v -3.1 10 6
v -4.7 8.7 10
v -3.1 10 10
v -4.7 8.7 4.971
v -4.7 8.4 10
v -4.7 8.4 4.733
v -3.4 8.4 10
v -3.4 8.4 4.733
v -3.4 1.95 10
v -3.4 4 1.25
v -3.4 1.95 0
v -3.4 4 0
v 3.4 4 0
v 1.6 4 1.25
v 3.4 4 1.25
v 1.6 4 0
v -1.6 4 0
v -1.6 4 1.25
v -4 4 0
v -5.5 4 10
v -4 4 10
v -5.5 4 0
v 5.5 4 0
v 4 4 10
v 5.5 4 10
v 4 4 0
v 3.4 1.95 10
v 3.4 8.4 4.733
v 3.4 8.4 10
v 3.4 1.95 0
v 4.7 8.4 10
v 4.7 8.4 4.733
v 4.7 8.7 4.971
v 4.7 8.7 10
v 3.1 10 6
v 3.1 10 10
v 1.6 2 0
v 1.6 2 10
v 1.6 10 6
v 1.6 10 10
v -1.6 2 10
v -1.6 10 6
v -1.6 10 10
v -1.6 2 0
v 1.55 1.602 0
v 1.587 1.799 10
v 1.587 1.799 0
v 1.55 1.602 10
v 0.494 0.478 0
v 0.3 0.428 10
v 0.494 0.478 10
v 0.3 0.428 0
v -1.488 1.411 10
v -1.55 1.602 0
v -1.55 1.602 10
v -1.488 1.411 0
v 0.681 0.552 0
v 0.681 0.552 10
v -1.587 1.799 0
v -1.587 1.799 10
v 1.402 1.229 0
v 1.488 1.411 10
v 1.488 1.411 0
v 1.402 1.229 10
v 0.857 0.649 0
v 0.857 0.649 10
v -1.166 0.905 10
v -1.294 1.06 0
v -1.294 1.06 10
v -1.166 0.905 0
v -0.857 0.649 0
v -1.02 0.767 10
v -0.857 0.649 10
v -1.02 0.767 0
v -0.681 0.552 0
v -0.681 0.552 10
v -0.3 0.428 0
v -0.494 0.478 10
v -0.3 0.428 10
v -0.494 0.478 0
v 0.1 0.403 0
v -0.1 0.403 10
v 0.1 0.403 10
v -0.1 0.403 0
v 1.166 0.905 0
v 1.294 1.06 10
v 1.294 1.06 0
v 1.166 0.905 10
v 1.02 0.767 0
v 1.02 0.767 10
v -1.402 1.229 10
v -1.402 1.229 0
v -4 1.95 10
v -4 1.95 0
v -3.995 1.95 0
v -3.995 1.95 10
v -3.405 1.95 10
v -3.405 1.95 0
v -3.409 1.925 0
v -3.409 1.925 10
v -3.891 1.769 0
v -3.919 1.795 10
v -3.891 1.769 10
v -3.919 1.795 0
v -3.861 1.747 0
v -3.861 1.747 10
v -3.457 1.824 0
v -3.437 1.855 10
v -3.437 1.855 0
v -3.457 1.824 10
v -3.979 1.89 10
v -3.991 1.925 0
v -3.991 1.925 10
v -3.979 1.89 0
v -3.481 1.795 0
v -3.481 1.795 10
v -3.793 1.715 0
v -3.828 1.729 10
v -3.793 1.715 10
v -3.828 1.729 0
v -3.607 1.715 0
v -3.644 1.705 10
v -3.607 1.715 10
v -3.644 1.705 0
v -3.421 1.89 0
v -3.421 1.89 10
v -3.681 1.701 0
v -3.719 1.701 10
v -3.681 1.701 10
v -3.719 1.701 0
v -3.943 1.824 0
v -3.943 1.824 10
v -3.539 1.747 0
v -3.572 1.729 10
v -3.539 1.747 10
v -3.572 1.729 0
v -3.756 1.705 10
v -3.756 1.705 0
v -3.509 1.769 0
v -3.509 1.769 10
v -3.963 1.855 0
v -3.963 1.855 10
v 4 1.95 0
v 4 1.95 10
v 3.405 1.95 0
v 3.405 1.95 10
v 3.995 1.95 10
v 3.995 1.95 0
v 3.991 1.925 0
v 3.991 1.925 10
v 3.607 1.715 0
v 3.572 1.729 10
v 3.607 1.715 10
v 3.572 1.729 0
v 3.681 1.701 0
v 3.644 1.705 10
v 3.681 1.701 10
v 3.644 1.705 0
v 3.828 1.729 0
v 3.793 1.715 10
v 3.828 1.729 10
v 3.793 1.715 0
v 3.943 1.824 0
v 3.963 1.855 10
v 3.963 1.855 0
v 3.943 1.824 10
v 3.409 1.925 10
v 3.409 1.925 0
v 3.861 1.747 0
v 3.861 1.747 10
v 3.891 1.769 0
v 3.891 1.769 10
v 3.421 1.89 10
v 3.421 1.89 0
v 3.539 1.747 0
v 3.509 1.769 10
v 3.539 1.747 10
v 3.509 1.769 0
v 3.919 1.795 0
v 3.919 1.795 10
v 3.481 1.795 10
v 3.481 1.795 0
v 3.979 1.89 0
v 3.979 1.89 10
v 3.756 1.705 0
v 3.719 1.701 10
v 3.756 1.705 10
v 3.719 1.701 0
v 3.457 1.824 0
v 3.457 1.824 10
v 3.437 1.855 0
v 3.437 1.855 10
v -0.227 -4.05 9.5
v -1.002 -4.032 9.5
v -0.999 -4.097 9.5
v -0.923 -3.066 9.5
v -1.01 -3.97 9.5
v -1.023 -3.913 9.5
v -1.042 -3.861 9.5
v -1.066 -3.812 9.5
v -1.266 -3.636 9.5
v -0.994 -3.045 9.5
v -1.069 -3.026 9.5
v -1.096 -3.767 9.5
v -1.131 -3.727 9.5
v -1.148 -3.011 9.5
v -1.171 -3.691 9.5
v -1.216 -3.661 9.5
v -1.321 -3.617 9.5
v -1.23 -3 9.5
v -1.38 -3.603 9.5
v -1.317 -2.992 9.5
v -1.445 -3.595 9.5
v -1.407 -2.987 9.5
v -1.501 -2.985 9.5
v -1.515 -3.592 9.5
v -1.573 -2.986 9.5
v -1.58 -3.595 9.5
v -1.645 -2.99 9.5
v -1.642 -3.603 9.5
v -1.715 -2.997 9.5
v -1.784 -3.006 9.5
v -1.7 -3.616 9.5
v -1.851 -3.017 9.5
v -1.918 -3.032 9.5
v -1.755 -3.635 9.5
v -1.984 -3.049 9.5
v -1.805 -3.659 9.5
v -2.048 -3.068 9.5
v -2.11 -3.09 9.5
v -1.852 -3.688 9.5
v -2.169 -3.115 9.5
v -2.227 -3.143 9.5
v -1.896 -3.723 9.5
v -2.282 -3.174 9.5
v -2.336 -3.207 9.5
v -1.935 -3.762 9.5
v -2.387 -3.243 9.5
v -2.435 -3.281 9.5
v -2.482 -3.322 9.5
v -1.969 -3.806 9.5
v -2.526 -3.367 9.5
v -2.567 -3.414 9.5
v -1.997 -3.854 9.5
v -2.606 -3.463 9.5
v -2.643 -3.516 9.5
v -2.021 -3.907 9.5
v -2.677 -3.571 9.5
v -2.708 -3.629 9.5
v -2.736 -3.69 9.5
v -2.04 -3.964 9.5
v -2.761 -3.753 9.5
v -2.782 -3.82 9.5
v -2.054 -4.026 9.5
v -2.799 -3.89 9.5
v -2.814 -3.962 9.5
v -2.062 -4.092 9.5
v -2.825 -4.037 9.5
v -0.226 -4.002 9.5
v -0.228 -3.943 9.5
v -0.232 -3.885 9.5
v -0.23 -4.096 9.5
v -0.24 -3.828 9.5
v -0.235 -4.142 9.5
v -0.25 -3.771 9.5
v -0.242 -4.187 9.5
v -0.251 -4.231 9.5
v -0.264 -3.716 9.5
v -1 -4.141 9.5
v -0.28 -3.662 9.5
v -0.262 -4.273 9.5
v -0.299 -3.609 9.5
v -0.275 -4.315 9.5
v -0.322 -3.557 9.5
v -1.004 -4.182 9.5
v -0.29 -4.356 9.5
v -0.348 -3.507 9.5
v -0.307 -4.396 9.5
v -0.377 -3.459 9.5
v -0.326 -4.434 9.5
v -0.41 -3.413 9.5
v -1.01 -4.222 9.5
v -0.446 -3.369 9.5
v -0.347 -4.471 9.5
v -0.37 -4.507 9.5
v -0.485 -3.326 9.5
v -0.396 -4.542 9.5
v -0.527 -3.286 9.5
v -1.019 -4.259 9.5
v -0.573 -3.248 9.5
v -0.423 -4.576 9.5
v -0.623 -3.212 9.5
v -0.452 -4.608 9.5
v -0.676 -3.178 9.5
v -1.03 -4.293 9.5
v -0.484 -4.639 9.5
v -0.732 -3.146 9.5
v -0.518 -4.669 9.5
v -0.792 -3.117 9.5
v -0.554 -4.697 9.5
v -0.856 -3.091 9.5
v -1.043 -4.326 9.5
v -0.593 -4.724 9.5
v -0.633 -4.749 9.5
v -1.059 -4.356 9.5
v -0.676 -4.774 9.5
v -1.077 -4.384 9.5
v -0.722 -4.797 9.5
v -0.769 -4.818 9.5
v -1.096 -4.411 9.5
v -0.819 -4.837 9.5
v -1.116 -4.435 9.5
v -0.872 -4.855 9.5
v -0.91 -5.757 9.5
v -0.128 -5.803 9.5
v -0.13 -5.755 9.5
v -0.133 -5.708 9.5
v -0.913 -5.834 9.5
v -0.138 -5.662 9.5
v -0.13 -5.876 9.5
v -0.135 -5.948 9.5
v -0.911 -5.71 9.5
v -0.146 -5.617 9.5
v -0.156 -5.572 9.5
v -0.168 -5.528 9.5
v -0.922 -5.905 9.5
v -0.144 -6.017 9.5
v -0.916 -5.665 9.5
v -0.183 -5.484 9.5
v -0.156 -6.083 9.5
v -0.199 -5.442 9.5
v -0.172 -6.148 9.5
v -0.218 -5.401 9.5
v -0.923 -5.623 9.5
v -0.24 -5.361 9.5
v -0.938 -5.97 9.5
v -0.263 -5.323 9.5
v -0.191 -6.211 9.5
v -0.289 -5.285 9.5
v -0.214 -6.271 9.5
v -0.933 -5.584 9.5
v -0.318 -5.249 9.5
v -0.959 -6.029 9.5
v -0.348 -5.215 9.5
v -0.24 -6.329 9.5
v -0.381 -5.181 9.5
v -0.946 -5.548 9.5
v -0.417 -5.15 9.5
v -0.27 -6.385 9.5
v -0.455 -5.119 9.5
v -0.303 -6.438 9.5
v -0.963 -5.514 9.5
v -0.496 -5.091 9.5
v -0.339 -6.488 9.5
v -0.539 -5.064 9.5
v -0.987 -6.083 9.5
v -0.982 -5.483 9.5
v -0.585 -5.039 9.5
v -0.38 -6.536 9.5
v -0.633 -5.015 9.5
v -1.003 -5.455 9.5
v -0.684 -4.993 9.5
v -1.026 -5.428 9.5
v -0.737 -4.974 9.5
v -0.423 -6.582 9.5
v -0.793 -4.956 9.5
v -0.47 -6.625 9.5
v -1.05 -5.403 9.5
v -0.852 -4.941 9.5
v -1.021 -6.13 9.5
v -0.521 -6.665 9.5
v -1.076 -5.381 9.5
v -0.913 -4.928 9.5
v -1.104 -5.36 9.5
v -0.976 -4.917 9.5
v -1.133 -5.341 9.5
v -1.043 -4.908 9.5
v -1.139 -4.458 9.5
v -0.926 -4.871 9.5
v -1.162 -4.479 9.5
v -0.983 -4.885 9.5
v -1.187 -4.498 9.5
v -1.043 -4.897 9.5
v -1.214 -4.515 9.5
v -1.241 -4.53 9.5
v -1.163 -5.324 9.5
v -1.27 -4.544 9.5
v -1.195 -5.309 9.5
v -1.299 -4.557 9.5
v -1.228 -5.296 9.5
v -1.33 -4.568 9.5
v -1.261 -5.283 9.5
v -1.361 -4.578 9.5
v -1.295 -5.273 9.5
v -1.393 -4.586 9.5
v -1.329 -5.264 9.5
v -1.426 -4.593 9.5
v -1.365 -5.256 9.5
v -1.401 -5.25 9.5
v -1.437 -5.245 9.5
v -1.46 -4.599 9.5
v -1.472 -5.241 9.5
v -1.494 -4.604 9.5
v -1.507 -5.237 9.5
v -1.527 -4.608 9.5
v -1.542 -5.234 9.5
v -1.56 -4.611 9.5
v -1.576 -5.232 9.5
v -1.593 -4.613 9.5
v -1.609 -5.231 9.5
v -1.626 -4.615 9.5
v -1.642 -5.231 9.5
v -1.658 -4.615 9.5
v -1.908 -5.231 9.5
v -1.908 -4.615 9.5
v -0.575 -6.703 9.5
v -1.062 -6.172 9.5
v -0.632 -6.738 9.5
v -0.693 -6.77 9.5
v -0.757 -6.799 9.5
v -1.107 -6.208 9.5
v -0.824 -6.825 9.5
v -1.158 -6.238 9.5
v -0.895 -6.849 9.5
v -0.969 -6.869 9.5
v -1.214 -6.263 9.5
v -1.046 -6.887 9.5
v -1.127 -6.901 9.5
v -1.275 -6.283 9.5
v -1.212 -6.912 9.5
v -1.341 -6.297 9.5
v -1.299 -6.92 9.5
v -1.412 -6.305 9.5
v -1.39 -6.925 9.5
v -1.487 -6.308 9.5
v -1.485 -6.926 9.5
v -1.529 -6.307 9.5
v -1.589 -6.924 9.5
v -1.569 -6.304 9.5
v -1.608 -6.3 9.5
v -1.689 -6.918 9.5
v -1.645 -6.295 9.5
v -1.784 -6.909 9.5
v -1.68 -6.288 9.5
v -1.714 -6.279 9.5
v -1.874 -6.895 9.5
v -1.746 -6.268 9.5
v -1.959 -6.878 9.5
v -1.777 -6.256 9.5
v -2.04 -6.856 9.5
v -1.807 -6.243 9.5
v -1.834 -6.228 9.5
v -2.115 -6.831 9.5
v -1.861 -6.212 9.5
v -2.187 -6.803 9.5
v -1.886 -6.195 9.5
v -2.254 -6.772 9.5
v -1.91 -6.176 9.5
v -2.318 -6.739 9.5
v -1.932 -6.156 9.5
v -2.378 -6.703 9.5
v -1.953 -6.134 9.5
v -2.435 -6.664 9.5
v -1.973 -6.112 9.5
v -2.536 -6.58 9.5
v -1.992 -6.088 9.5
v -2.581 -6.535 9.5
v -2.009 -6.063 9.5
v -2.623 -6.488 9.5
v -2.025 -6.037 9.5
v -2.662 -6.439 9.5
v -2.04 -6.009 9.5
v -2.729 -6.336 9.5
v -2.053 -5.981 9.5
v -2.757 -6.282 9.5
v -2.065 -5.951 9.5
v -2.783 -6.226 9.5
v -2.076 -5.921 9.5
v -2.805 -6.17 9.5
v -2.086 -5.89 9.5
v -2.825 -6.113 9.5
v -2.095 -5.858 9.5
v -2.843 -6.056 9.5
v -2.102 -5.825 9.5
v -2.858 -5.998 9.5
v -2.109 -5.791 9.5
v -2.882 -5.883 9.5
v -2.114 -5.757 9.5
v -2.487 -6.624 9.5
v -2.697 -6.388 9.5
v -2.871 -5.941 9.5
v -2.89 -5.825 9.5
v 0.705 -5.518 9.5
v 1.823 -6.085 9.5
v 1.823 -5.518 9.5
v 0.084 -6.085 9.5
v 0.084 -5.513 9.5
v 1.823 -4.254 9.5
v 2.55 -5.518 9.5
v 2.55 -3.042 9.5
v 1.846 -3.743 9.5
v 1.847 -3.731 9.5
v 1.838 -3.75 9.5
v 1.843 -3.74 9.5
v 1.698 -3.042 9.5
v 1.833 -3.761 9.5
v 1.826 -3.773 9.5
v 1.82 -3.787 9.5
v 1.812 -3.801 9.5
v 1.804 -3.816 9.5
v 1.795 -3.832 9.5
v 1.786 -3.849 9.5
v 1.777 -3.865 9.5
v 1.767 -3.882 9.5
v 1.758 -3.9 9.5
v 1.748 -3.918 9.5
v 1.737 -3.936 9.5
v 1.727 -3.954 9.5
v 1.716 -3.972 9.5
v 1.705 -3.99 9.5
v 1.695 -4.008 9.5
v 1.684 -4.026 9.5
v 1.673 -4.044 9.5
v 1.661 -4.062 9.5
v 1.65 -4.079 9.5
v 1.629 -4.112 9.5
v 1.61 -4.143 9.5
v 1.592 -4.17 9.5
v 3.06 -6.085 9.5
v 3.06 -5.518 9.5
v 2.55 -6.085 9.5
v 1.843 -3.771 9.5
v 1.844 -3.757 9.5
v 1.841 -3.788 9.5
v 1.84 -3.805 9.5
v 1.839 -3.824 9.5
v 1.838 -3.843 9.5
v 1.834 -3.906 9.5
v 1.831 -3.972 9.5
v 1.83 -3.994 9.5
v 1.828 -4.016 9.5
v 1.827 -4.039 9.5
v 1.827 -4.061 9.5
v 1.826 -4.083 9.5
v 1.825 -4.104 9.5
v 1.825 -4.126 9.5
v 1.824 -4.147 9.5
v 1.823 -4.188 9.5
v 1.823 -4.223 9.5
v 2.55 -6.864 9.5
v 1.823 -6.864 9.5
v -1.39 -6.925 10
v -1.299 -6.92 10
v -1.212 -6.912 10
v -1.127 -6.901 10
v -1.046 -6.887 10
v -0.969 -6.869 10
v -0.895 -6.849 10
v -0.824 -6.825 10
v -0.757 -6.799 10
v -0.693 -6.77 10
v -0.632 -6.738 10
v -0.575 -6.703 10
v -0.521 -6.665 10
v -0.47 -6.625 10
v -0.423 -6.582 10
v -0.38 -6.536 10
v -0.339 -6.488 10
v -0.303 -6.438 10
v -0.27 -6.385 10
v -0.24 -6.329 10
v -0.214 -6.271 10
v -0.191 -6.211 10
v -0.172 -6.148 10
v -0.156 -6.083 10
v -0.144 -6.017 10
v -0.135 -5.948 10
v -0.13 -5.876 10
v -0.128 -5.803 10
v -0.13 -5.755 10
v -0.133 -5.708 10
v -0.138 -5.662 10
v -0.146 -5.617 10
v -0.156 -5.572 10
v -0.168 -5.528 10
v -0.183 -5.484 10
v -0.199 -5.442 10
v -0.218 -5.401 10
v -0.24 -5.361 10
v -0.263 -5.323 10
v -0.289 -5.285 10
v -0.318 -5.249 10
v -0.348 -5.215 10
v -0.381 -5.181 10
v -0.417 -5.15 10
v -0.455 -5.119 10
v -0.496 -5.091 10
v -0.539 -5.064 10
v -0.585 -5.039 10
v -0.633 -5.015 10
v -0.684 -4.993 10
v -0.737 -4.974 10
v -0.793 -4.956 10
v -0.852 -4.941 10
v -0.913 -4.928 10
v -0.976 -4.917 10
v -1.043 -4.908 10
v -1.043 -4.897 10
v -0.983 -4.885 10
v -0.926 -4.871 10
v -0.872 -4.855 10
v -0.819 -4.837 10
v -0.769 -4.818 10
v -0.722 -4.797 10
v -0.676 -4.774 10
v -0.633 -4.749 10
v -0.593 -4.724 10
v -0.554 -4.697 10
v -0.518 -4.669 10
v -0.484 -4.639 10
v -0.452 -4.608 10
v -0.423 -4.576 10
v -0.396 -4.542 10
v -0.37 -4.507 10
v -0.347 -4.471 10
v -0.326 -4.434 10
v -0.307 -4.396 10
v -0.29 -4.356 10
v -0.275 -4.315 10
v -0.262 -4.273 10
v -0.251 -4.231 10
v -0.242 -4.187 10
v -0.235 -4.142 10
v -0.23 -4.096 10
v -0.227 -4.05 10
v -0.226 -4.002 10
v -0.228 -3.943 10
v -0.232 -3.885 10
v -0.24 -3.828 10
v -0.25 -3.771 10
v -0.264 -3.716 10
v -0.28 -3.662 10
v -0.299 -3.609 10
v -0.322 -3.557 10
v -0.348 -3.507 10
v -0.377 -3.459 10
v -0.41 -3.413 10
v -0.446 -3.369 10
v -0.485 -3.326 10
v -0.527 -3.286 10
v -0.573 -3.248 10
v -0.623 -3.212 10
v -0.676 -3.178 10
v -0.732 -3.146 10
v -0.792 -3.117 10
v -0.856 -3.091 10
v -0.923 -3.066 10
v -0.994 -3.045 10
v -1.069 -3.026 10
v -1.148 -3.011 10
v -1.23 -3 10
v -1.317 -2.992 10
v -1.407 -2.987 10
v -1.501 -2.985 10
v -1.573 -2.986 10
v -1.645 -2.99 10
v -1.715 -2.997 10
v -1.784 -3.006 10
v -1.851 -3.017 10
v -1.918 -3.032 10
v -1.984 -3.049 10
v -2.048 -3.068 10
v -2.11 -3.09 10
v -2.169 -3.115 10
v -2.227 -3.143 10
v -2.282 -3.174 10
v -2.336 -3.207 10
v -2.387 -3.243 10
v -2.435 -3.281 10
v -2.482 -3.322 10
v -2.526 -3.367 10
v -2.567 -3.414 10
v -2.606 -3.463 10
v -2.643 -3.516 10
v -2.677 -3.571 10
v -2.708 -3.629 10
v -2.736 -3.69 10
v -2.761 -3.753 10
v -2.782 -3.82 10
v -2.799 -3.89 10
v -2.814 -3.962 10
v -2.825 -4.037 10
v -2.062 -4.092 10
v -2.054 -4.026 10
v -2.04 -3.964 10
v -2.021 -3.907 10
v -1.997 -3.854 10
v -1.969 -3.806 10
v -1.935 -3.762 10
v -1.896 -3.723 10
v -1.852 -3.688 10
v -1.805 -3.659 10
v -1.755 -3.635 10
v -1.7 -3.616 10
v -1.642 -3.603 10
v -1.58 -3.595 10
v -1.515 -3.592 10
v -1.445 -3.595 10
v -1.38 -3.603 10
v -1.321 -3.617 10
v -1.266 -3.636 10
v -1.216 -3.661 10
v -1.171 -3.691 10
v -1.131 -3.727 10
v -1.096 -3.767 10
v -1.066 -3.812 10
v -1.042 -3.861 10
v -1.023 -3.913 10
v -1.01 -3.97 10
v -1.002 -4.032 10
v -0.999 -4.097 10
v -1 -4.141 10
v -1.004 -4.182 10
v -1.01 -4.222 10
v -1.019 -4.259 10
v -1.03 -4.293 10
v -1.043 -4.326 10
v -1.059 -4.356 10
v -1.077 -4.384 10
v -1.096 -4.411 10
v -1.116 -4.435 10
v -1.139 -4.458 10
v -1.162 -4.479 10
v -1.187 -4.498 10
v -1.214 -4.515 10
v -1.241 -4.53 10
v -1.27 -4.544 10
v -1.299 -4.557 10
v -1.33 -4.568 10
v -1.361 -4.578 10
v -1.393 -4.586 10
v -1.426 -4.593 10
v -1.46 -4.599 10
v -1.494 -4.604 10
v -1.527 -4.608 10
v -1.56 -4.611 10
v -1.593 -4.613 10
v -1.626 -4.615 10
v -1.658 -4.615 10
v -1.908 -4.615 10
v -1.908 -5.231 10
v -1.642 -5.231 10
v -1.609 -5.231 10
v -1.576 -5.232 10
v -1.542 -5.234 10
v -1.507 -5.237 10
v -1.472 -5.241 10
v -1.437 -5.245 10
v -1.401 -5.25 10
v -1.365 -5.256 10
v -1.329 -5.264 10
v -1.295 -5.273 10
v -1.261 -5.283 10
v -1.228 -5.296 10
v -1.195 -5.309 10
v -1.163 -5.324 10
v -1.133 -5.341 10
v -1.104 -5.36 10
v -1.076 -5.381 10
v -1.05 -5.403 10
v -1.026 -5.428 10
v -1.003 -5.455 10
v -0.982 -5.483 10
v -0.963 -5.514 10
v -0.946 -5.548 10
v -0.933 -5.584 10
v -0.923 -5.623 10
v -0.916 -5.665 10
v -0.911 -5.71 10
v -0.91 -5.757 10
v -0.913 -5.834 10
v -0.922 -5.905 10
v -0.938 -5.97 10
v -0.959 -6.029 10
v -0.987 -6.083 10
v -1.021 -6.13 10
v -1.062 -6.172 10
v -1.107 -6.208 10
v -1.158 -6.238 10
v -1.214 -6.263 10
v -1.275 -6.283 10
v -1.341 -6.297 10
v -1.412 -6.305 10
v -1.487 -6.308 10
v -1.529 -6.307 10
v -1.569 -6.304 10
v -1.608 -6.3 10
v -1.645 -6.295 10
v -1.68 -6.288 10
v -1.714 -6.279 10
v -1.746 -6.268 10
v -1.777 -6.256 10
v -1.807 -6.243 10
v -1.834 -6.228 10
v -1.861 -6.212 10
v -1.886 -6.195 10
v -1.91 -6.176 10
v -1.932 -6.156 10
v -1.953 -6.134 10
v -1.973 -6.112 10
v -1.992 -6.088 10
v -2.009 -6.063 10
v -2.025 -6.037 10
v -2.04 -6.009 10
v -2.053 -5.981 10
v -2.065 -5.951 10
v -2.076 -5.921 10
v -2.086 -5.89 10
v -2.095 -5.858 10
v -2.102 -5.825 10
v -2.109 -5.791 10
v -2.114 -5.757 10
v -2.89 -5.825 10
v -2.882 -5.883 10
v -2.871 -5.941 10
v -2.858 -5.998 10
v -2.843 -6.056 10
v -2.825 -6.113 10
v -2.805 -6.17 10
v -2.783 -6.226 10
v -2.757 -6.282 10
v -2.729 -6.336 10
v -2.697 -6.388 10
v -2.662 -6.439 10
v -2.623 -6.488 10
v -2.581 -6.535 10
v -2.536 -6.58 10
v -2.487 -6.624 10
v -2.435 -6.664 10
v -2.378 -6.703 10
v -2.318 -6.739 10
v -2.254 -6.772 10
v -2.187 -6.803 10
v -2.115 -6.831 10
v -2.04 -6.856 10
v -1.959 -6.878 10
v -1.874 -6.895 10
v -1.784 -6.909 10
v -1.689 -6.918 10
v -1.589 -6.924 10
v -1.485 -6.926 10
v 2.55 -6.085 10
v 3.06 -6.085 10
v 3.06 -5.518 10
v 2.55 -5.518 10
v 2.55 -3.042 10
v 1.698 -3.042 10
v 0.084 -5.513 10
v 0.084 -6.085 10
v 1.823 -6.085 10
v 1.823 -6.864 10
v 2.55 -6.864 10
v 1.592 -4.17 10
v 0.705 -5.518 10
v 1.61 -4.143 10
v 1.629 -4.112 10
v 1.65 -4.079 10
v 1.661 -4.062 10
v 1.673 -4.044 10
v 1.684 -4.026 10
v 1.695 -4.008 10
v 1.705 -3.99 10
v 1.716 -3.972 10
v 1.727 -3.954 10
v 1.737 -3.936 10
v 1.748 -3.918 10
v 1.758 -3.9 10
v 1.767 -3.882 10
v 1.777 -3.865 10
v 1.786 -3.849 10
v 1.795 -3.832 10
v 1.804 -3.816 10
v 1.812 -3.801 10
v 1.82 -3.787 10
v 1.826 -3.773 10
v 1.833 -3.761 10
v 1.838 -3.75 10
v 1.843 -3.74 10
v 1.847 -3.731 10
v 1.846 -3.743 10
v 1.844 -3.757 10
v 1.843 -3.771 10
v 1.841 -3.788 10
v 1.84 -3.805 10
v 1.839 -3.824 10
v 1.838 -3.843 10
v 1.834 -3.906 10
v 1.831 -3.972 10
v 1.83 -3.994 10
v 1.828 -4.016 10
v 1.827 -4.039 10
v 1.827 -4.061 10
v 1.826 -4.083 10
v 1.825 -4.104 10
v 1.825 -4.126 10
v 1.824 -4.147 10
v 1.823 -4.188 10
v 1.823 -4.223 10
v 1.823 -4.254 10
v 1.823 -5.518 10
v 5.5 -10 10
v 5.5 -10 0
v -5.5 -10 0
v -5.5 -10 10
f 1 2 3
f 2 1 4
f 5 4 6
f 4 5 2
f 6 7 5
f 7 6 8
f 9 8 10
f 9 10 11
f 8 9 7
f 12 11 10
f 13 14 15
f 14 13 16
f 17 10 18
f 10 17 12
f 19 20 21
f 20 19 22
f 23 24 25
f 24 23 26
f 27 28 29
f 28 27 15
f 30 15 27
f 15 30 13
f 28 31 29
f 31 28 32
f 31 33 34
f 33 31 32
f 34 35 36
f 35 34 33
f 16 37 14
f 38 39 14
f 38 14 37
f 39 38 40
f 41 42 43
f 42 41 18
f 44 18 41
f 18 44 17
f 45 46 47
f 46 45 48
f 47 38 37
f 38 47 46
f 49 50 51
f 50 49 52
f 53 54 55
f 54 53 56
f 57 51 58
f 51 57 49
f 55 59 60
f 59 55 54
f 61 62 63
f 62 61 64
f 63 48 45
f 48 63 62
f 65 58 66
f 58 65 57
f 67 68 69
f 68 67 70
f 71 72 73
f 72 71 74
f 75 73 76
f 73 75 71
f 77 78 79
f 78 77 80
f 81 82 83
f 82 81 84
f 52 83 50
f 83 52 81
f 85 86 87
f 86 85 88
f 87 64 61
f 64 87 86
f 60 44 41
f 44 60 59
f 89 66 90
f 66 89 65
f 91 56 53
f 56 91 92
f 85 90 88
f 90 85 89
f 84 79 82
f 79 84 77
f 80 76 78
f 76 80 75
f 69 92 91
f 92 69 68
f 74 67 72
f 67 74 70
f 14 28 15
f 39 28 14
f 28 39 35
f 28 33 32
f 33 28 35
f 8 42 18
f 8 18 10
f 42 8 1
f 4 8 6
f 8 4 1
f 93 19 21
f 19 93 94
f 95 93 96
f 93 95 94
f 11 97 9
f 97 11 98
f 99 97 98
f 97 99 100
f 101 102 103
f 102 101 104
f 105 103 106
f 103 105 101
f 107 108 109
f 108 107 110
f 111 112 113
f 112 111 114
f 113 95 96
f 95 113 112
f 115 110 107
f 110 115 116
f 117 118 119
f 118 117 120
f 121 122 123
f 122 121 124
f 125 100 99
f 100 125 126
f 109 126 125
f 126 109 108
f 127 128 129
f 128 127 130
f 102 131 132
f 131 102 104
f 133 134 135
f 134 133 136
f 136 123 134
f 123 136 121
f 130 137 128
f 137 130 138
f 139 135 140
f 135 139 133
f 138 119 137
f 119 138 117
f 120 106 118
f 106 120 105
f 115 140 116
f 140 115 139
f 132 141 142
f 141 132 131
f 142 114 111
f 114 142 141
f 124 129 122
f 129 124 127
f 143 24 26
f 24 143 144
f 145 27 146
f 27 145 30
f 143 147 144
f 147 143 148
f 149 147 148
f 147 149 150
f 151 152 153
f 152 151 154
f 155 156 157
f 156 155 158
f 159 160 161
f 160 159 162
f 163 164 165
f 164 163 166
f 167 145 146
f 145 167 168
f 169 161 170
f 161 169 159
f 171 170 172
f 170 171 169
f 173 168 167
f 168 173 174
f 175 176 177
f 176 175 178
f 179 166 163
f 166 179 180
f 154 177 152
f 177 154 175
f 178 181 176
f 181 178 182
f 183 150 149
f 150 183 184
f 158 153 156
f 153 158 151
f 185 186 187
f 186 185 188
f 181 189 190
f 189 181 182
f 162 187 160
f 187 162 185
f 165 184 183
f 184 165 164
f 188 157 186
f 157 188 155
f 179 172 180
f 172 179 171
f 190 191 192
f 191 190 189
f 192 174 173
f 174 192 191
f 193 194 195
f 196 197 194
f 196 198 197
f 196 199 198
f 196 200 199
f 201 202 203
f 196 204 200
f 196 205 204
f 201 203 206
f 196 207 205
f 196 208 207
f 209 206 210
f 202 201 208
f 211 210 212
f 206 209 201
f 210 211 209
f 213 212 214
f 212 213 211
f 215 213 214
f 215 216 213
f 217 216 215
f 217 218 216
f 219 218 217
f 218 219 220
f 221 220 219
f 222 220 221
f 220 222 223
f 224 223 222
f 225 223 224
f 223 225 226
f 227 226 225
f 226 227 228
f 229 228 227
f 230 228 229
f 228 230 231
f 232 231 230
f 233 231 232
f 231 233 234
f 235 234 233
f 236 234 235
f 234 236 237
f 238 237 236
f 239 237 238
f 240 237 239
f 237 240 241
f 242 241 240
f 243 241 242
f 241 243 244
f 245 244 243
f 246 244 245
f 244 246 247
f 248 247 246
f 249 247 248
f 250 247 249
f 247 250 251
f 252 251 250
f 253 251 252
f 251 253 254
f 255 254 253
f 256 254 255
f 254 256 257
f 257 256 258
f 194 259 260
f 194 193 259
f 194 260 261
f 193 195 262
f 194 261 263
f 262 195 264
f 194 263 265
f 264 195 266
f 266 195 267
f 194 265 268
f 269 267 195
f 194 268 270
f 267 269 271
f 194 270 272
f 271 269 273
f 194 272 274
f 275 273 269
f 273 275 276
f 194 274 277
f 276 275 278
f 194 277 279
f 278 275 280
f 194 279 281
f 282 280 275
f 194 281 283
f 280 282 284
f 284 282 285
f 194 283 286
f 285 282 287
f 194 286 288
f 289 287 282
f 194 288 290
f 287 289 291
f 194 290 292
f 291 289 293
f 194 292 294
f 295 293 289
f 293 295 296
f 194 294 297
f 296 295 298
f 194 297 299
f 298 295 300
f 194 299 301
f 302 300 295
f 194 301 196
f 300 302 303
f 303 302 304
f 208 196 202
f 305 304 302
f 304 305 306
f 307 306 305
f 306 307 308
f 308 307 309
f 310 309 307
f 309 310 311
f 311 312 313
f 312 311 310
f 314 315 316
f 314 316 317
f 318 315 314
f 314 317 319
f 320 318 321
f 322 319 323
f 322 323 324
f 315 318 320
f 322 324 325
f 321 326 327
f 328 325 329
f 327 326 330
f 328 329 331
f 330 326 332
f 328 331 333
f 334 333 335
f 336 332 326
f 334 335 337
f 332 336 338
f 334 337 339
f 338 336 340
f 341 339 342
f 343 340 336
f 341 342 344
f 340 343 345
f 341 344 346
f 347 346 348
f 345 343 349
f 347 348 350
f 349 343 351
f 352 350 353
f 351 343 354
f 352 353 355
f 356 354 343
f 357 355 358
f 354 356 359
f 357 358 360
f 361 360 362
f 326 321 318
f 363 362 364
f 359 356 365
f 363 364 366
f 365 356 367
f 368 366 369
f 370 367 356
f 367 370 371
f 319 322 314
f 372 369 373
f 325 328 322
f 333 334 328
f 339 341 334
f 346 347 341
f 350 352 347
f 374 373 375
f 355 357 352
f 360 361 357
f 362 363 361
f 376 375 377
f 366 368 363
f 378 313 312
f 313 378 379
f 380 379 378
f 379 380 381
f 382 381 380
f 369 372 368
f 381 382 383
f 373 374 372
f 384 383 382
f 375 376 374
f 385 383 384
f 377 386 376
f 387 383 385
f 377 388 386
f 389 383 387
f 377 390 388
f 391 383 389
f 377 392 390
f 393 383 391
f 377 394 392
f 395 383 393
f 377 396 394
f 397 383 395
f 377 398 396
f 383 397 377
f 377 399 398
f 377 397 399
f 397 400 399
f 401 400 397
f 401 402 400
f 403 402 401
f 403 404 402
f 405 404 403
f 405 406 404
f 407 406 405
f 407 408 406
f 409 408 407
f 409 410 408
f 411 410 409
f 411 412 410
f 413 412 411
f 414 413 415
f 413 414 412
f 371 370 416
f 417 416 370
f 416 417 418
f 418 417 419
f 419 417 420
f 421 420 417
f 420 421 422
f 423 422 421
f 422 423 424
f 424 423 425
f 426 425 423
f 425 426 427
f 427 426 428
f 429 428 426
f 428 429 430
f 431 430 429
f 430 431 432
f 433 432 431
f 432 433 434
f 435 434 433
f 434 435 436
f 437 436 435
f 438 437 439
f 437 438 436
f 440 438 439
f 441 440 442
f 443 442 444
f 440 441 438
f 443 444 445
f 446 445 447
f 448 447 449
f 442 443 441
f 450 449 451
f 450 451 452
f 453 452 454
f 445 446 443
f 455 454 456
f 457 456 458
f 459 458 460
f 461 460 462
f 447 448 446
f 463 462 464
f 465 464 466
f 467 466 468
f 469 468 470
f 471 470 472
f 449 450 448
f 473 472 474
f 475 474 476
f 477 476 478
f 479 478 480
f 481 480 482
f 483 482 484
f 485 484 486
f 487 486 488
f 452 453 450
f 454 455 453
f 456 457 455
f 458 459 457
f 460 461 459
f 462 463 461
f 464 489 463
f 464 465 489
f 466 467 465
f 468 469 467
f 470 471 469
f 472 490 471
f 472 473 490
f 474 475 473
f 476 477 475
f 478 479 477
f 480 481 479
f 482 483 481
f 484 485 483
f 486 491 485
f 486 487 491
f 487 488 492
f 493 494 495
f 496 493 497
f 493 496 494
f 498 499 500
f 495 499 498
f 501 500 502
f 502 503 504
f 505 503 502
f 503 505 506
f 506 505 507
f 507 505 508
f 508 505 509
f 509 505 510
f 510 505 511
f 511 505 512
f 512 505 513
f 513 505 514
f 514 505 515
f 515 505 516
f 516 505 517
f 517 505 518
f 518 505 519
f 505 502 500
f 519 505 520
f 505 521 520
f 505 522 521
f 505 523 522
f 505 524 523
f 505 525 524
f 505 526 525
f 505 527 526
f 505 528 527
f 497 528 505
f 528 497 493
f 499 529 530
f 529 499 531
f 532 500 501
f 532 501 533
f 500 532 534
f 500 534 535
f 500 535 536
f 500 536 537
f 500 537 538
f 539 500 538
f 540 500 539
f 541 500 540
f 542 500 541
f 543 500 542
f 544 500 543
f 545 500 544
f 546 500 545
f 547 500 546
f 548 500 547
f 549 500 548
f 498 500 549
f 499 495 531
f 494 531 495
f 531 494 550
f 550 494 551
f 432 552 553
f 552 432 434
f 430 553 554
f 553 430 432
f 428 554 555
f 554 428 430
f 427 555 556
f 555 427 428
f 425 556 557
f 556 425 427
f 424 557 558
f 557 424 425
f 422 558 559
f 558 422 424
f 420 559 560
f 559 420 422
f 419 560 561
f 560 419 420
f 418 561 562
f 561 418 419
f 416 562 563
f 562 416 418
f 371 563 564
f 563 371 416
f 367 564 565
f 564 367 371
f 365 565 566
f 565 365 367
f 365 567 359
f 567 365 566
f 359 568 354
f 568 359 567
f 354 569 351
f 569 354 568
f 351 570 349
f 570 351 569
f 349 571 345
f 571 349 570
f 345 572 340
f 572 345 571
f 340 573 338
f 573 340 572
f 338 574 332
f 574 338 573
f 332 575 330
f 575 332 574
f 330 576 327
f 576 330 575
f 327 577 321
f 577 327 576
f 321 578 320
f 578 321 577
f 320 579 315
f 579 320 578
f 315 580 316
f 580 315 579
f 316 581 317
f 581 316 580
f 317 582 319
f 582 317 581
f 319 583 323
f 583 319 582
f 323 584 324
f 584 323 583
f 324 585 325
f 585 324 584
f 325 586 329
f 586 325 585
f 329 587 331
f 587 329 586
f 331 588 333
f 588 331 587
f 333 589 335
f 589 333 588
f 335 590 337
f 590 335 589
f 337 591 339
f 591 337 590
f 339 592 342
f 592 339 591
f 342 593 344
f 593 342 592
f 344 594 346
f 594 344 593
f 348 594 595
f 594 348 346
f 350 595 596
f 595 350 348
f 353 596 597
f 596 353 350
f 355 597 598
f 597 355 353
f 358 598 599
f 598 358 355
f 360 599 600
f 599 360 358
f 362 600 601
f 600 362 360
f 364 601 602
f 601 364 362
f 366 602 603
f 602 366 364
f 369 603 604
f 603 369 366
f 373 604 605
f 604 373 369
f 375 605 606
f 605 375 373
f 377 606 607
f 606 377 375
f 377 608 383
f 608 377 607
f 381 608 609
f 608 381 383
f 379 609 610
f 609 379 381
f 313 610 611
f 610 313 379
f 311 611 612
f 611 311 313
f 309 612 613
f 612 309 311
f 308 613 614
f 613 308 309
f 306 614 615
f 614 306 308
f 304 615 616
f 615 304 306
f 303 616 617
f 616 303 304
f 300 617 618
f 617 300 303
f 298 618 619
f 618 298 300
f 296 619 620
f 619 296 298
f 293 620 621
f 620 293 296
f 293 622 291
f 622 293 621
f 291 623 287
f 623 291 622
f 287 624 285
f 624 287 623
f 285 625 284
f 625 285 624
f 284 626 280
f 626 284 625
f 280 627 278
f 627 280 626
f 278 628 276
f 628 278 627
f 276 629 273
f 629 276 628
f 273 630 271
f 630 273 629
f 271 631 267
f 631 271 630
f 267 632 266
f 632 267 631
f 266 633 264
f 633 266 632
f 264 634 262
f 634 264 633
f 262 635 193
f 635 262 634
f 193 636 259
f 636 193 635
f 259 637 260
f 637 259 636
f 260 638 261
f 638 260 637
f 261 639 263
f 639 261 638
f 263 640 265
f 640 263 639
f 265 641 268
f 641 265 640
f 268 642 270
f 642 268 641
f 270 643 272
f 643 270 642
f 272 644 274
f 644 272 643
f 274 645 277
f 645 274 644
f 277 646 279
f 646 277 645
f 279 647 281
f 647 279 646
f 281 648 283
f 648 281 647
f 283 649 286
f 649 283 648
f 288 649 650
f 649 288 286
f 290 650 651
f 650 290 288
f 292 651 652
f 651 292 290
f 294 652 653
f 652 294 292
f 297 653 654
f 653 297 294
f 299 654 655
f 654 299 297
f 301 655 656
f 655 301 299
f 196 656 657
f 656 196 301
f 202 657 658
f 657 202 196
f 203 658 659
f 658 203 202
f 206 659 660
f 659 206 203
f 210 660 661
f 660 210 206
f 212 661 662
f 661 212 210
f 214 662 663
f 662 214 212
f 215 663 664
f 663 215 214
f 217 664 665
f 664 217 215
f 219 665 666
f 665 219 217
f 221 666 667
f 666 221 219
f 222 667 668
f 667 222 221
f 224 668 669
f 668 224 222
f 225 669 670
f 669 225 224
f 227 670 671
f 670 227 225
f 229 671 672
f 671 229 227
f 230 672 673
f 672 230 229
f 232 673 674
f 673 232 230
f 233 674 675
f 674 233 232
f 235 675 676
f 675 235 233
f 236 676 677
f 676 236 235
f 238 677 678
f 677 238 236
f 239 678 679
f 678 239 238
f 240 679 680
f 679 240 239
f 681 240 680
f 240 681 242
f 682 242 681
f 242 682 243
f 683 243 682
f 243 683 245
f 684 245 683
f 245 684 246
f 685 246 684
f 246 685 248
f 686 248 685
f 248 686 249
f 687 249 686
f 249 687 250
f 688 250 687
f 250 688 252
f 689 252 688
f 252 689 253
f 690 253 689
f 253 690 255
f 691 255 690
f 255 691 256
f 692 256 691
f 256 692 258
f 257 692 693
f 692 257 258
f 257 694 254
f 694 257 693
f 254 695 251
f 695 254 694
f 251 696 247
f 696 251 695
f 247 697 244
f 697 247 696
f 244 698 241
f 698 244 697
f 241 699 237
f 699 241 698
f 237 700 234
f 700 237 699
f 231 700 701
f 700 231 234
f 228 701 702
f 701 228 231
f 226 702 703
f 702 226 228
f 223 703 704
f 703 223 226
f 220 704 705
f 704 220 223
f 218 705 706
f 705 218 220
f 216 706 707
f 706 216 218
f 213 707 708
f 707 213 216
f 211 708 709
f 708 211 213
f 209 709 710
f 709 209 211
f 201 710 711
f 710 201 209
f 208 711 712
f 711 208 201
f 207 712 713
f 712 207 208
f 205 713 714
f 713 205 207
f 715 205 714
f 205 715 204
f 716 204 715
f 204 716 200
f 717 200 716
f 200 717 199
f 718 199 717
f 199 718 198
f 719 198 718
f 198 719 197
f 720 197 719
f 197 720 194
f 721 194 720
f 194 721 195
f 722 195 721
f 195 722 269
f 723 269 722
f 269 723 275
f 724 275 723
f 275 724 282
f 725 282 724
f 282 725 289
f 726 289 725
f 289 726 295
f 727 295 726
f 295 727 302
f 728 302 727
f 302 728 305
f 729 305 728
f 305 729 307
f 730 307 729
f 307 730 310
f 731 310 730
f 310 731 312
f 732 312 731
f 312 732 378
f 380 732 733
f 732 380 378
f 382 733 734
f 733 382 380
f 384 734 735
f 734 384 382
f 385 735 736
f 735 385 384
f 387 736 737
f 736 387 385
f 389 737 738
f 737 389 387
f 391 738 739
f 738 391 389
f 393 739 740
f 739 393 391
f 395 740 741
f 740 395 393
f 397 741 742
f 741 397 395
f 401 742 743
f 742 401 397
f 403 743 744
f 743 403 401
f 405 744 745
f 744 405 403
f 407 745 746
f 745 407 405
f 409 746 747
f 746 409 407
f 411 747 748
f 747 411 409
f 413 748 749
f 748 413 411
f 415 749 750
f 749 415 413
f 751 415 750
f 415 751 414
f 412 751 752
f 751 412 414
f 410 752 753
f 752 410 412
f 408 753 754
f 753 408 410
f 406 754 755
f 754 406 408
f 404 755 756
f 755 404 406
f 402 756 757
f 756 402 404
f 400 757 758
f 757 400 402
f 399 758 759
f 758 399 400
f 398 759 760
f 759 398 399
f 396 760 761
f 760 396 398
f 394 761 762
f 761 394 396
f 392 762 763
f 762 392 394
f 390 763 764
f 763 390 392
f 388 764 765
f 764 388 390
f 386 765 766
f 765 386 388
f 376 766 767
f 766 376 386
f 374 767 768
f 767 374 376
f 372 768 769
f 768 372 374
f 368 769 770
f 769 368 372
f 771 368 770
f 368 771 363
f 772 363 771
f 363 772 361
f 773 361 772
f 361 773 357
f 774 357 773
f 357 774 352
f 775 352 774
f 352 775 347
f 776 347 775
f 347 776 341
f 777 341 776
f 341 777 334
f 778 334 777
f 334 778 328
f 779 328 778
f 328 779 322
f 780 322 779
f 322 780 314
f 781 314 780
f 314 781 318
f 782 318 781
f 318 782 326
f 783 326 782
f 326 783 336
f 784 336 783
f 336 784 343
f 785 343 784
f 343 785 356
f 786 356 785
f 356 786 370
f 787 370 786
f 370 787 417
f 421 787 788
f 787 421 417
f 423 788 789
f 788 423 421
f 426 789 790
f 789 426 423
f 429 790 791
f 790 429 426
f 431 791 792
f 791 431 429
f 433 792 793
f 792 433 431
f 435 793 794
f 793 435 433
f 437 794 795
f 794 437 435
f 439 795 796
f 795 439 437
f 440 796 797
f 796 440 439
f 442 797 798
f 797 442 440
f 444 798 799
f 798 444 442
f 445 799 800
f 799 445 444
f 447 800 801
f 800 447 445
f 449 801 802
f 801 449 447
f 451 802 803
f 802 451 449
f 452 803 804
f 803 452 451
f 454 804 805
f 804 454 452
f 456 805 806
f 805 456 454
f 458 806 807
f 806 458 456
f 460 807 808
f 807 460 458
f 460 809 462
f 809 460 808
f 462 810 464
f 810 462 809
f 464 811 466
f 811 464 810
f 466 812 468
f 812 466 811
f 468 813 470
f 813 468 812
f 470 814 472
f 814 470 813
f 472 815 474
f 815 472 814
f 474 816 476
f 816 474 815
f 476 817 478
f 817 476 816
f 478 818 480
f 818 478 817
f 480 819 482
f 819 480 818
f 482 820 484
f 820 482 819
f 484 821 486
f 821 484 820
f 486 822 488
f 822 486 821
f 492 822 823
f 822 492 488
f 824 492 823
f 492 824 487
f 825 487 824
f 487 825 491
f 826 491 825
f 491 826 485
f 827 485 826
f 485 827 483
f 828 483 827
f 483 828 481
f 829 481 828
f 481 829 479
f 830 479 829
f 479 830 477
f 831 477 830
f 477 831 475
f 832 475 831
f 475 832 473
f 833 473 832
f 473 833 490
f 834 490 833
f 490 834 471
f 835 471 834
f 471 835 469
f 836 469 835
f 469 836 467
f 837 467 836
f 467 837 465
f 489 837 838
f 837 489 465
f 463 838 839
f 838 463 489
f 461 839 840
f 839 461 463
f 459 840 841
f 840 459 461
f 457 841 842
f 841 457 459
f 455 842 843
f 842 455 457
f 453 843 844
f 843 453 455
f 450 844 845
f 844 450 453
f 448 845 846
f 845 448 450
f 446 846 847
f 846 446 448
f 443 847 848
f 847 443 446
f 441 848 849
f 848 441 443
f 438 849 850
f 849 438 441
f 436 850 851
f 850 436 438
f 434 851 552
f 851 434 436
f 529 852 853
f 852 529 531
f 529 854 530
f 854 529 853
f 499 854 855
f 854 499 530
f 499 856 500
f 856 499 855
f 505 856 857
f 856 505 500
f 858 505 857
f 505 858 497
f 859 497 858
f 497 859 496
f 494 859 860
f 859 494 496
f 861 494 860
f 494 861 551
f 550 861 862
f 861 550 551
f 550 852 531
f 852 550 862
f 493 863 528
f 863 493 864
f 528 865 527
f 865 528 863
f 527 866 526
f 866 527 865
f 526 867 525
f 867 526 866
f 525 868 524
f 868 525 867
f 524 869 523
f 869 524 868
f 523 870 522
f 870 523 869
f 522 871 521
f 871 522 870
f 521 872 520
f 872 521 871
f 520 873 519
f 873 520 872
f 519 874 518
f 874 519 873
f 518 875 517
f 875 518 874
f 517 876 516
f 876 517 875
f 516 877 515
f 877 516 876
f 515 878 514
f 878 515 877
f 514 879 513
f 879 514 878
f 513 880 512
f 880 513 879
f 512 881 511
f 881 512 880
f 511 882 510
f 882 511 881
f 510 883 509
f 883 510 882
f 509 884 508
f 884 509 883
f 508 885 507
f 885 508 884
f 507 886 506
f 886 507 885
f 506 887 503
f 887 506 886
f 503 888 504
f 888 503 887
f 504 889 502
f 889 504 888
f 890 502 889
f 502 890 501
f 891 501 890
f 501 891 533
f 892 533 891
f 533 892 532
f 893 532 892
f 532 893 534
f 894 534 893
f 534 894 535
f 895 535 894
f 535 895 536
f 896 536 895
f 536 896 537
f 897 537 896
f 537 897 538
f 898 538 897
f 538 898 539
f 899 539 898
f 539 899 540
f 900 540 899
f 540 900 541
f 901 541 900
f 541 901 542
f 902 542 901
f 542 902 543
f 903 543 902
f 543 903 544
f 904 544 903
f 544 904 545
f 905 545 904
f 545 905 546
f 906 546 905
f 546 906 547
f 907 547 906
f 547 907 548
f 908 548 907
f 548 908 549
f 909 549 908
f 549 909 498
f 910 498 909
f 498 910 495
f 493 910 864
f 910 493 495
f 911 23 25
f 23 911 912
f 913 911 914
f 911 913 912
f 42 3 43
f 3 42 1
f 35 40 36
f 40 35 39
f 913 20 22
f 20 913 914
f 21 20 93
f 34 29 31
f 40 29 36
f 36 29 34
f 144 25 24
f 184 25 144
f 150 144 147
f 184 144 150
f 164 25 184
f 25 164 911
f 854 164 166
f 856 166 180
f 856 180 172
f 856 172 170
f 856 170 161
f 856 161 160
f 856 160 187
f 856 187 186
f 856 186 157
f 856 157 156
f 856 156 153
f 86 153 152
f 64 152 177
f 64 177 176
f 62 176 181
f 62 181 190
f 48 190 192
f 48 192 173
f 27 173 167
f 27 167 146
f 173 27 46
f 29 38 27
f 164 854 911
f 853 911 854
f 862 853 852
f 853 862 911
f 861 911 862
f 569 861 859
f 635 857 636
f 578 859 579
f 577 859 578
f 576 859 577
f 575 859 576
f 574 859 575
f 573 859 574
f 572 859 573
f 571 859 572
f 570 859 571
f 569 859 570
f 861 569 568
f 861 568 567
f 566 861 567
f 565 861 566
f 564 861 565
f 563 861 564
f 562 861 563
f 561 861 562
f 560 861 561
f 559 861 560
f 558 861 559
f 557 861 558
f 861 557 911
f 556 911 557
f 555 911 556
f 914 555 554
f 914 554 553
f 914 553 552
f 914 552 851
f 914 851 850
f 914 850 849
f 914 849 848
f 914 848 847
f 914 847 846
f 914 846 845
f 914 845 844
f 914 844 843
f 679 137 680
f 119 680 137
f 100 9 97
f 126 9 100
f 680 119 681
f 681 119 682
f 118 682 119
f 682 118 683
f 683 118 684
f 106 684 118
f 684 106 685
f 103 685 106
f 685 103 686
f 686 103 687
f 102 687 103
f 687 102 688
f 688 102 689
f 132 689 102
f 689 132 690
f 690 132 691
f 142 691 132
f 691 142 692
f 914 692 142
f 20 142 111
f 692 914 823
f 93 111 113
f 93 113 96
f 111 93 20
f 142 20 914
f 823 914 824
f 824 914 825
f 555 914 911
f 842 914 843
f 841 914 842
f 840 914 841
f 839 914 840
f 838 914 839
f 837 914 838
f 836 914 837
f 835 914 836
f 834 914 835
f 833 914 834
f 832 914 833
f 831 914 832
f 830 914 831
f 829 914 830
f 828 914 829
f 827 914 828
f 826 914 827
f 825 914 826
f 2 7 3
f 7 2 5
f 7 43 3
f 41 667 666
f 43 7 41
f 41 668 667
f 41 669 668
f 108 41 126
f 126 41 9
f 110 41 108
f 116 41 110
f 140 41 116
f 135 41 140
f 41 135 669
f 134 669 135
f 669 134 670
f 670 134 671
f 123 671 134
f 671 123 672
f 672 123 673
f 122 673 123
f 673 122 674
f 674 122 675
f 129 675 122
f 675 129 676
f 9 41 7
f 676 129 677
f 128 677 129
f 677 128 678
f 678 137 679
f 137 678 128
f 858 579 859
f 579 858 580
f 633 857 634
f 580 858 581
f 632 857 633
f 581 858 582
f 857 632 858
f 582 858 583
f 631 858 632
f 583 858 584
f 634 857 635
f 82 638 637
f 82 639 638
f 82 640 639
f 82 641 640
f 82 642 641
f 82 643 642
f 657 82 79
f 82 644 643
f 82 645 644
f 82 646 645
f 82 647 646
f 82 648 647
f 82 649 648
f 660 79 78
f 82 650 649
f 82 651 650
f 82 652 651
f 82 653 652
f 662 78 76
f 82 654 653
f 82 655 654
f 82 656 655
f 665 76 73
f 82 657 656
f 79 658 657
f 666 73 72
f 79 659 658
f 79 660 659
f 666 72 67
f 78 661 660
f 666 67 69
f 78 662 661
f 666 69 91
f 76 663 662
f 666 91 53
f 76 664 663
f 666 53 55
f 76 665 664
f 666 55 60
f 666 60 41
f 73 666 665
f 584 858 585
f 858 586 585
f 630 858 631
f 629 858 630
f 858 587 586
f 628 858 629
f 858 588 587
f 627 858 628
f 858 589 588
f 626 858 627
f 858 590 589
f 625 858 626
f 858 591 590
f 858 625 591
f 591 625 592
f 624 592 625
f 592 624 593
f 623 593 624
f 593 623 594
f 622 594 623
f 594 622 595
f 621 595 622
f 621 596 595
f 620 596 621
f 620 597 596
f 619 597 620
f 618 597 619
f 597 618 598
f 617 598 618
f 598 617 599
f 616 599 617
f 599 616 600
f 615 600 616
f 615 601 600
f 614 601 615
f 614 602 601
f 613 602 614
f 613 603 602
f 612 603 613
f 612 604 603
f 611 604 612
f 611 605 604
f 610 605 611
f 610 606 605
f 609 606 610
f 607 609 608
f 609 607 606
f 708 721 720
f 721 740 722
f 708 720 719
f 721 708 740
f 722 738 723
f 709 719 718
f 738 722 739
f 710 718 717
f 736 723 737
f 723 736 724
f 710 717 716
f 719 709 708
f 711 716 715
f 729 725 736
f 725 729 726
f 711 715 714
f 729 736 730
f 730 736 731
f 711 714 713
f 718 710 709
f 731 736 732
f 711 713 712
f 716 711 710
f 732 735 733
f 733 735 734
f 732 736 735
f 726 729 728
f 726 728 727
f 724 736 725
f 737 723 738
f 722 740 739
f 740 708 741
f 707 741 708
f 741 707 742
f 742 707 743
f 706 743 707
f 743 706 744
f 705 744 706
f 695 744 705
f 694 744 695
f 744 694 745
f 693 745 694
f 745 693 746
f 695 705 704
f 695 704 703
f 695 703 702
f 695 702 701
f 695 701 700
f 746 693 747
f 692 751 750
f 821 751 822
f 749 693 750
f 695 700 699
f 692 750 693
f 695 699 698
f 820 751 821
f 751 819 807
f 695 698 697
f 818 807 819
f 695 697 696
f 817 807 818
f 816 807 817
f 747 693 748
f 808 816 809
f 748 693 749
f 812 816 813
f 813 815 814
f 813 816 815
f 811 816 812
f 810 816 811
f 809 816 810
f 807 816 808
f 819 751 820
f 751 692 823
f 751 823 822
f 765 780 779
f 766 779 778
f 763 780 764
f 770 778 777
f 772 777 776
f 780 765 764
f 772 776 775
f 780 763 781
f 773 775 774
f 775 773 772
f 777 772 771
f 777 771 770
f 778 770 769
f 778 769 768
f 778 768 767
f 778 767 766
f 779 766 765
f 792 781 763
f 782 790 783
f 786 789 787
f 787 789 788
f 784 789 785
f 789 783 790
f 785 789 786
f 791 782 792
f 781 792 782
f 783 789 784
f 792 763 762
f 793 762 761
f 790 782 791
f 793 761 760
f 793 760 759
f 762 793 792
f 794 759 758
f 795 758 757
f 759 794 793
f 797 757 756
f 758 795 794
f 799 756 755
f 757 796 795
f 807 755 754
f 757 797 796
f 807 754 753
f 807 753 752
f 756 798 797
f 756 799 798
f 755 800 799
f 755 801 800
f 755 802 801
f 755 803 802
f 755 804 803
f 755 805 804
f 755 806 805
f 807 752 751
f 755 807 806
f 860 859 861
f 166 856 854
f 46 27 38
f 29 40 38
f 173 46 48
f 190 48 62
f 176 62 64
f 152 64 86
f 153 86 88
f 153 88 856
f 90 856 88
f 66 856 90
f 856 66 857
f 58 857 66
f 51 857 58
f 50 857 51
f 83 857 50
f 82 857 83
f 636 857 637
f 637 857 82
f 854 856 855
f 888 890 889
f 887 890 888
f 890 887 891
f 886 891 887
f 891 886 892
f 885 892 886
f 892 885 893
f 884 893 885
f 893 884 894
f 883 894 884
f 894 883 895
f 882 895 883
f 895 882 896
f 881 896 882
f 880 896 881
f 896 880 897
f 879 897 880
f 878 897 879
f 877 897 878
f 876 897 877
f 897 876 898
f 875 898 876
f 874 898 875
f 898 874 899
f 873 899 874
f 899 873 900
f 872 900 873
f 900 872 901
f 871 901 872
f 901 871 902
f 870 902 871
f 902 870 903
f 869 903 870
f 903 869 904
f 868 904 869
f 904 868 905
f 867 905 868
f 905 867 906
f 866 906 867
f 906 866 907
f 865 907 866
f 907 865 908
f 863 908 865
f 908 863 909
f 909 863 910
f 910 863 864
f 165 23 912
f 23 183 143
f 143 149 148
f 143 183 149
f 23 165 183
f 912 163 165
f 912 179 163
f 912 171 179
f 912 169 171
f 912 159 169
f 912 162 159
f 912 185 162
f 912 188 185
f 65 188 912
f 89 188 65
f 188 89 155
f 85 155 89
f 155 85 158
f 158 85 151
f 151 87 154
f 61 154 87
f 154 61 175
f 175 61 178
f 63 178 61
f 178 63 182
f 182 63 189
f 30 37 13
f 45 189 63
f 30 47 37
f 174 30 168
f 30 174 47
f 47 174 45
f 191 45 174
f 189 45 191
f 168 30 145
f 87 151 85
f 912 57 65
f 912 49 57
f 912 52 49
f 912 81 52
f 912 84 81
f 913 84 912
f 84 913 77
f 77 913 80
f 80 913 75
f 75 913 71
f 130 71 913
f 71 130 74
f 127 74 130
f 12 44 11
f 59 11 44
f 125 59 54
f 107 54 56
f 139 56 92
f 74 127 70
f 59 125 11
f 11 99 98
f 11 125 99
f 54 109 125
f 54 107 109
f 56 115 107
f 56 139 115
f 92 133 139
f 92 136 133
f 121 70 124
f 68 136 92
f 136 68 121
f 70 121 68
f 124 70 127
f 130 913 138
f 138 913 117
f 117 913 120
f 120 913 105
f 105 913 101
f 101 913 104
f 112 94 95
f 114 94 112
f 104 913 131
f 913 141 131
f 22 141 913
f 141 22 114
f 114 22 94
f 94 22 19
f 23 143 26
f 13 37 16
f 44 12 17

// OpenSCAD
$fn = 50;

difference() {
	union() {
		translate(v = [0, 4.0, 0]) {
			rotate(a = [90, 0, 0]) {
				difference() {
					union() {
						translate(v = [-5.5, 0, -6.0]) {
							cube(size = [11.0, 10.0, 20.0]);
						}
					}
					union() {
						translate(v = [0, 0, 0]) {
							rotate(a = [0, 0, 0]) {
								difference() {
									union() {
										translate(v = [0, 10.1, 0]) {
											rotate(a = [90, 0, 0]) {
												linear_extrude(height = 10.2) {
													polygon(points = [[-3.1, -6.1], [-3.1, -6.0], [-4.7, -4.7], [-4.7, -4.4], [-3.4, -4.4], [-3.4, 0], [-5.6, 0], [-5.6, -6.1]]);
												}
											}
										}
										translate(v = [0, 10.1, 0]) {
											rotate(a = [90, 0, 0]) {
												linear_extrude(height = 10.2) {
													polygon(points = [[3.1, -6.1], [3.1, -6.0], [4.7, -4.7], [4.7, -4.4], [3.4, -4.4], [3.4, 0], [5.6, 0], [5.6, -6.1]]);
												}
											}
										}
										translate(v = [-1.5999999999999999, -0.1, -6.1]) {
											cube(size = [3.1999999999999997, 10.2, 8.1]);
										}
										translate(v = [0, 10.1, 2.0]) {
											rotate(a = [90, 0, 0]) {
												cylinder(h = 10.2, r = 1.5999999999999999);
											}
										}
									}
									union();
								}
							}
						}
						translate(v = [0, 0, 212.0]) {
							rotate(a = [0, 180, 0]) {
								difference() {
									union() {
										translate(v = [0, 10.1, 0]) {
											rotate(a = [90, 0, 0]) {
												linear_extrude(height = 10.2) {
													polygon(points = [[-3.1, -6.1], [-3.1, -6.0], [-4.7, -4.7], [-4.7, -4.4], [-3.4, -4.4], [-3.4, 0], [-5.6, 0], [-5.6, -6.1]]);
												}
											}
										}
										translate(v = [0, 10.1, 0]) {
											rotate(a = [90, 0, 0]) {
												linear_extrude(height = 10.2) {
													polygon(points = [[3.1, -6.1], [3.1, -6.0], [4.7, -4.7], [4.7, -4.4], [3.4, -4.4], [3.4, 0], [5.6, 0], [5.6, -6.1]]);
												}
											}
										}
										translate(v = [-1.5999999999999999, -0.1, -6.1]) {
											cube(size = [3.1999999999999997, 10.2, 8.1]);
										}
										translate(v = [0, 10.1, 2.0]) {
											rotate(a = [90, 0, 0]) {
												cylinder(h = 10.2, r = 1.5999999999999999);
											}
										}
									}
									union();
								}
							}
						}
						translate(v = [-5.6, 0, 0]) {
							rotate(a = [90, 0, 90]) {
								linear_extrude(height = 11.2) {
									polygon(points = [[-0.1, -6.1], [6.079166666666667, -6.1], [1.25, 0], [-0.1, 0]]);
								}
							}
						}
						translate(v = [0, 10.1, 0]) {
							rotate(a = [90, 0, 0]) {
								linear_extrude(height = 10.2) {
									polygon(points = [[-3.4, -0.1], [-4.0, -0.1], [-4.0, 2.05], [-3.4, 2.05]]);
								}
							}
						}
						translate(v = [-3.6999999999999997, 10.1, 2.0]) {
							rotate(a = [90, 0, 0]) {
								cylinder(h = 10.2, r = 0.3);
							}
						}
						translate(v = [0, 10.1, 0]) {
							rotate(a = [90, 0, 0]) {
								linear_extrude(height = 10.2) {
									polygon(points = [[3.4, -0.1], [4.0, -0.1], [4.0, 2.05], [3.4, 2.05]]);
								}
							}
						}
						translate(v = [3.6999999999999997, 10.1, 2.0]) {
							rotate(a = [90, 0, 0]) {
								cylinder(h = 10.2, r = 0.3);
							}
						}
						translate(v = [-5.6, 0, 0]) {
							rotate(a = [90, 0, 90]) {
								linear_extrude(height = 11.2) {
									polygon(points = [[-0.1, 218.1], [6.079166666666667, 218.1], [1.25, 212.0], [-0.1, 212.0]]);
								}
							}
						}
						translate(v = [0, 10.1, 0]) {
							rotate(a = [90, 0, 0]) {
								linear_extrude(height = 10.2) {
									polygon(points = [[-3.4, 212.1], [-4.0, 212.1], [-4.0, 209.95], [-3.4, 209.95]]);
								}
							}
						}
						translate(v = [-3.6999999999999997, 10.1, 210.0]) {
							rotate(a = [90, 0, 0]) {
								cylinder(h = 10.2, r = 0.3);
							}
						}
						translate(v = [0, 10.1, 0]) {
							rotate(a = [90, 0, 0]) {
								linear_extrude(height = 10.2) {
									polygon(points = [[3.4, 212.1], [4.0, 212.1], [4.0, 209.95], [3.4, 209.95]]);
								}
							}
						}
						translate(v = [3.6999999999999997, 10.1, 210.0]) {
							rotate(a = [90, 0, 0]) {
								cylinder(h = 10.2, r = 0.3);
							}
						}
						translate(v = [-5.6, 0, 0]) {
							rotate(a = [90, 0, 90]) {
								linear_extrude(height = 11.2) {
									polygon(points = [[10.1, 14.5], [10.1, 197.5], [4.0, 190.3], [4.0, 21.7]]);
								}
							}
						}
						translate(v = [0, 9.5, 9.0]) {
							rotate(a = [-90, 0, 0]) {
								linear_extrude(height = 0.6) {
									text(font = "Arial:style=Bold", halign = "center", size = 4.0, text = "34", valign = "center");
								}
							}
						}
					}
				}
			}
		}
	}
	union();
}
